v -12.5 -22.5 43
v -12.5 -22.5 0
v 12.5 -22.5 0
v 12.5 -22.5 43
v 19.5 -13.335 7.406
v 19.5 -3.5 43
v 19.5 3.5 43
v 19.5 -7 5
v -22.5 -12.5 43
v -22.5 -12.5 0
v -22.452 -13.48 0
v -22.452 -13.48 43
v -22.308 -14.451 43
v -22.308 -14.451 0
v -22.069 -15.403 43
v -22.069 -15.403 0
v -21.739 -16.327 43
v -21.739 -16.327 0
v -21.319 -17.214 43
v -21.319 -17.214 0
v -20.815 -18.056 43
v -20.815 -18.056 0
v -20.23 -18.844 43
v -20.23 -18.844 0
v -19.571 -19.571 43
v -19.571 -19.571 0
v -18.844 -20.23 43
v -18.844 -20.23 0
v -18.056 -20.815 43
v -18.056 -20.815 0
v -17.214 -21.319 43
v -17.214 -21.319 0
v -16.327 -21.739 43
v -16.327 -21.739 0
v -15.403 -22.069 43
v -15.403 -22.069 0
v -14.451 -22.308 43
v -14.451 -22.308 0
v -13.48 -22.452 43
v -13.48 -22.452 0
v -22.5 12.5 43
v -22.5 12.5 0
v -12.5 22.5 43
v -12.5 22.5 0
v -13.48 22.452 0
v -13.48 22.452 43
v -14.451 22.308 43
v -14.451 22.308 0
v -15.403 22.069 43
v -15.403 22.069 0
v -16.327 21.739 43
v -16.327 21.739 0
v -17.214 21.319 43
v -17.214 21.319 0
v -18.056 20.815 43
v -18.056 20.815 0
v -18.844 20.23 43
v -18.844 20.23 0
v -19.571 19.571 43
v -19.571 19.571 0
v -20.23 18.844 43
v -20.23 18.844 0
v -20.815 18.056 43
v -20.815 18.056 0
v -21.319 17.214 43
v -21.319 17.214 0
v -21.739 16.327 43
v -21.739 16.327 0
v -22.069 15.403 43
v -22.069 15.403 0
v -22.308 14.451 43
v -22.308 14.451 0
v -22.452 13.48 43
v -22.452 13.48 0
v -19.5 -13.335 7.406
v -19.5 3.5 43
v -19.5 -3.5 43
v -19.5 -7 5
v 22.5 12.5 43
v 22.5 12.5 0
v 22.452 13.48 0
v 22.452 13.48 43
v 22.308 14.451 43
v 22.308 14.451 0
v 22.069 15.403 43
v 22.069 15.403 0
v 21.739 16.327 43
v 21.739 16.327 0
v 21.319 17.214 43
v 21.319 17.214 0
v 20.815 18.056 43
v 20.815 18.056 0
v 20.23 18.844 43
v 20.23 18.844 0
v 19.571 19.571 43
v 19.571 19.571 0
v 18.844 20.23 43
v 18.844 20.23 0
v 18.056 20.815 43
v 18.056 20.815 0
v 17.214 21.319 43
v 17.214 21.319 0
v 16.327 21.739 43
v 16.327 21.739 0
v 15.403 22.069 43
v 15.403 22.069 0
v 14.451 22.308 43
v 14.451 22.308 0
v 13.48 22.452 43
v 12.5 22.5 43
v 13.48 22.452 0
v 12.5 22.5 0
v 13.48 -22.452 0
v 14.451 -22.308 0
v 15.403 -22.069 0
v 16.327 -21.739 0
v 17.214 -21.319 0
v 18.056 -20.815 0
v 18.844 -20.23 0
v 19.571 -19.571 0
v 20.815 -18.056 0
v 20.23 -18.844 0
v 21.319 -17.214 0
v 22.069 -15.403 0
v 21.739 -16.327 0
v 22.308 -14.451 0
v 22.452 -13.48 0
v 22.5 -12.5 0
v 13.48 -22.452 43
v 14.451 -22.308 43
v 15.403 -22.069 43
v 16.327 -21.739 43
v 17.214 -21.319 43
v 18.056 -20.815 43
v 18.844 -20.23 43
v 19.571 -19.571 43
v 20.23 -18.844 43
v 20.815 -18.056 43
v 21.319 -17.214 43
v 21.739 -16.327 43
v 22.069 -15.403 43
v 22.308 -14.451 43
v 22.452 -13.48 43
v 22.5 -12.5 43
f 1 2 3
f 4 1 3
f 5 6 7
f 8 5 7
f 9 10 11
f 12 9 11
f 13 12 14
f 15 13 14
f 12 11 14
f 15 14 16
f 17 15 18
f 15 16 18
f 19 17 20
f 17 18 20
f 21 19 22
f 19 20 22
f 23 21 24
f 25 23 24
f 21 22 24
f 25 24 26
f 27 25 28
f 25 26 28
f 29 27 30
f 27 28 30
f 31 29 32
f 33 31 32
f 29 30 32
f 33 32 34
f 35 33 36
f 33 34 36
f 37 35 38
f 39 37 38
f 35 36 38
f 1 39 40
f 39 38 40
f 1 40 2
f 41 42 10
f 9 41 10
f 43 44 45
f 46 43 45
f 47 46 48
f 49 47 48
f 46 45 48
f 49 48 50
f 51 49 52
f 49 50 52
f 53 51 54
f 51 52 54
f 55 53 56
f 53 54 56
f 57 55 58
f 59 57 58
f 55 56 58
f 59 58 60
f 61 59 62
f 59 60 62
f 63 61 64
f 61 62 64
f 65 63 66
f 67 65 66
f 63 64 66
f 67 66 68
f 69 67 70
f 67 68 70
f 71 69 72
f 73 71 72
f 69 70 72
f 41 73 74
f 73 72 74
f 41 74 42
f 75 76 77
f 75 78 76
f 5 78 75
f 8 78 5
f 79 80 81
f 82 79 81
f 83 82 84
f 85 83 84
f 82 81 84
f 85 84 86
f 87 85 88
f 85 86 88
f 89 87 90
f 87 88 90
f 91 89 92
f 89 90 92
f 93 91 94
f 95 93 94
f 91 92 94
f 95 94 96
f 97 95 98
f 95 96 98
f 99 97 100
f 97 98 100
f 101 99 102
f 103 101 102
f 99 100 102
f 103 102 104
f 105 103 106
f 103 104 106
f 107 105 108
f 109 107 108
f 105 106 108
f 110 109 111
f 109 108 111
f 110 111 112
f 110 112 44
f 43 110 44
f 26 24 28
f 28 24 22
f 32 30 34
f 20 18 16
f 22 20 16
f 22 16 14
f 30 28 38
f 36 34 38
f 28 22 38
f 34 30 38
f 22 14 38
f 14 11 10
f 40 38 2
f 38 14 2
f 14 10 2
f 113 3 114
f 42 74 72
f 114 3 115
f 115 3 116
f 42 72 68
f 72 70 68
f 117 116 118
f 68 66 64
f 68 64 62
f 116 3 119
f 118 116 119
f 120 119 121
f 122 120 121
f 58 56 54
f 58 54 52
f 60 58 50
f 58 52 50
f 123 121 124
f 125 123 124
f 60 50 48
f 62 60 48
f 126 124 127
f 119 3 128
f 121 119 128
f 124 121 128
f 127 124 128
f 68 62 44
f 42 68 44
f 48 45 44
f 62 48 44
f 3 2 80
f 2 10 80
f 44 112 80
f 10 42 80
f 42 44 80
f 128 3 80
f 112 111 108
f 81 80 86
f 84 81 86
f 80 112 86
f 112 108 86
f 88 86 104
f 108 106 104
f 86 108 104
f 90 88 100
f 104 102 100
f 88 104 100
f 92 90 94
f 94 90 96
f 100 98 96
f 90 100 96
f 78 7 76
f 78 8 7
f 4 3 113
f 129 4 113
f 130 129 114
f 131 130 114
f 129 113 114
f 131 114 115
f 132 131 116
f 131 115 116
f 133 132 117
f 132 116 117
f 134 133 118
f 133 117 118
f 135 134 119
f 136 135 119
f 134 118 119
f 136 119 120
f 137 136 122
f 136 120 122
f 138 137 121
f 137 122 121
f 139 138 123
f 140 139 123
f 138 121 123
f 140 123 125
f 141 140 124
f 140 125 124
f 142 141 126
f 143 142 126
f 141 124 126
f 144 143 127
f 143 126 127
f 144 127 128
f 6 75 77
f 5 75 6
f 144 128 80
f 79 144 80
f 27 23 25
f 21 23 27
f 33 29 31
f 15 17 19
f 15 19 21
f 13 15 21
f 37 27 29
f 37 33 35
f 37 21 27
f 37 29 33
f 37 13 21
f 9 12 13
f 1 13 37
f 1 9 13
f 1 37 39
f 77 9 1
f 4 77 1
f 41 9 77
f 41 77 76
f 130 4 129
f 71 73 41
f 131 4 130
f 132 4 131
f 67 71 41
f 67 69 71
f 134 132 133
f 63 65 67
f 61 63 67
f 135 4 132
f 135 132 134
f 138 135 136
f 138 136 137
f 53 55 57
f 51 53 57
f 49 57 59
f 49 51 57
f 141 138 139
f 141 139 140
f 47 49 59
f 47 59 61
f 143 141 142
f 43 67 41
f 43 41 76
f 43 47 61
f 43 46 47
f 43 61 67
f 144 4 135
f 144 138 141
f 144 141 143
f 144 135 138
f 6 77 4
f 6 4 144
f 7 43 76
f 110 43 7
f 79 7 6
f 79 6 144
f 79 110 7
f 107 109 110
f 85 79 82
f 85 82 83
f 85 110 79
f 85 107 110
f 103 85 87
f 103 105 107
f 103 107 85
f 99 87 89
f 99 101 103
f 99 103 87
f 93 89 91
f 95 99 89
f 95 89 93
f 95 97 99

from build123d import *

# Parameters (mm, degrees)
F1_DEPTH = 43
F2_W     = 39
F2_H     = 7
F4_W     = 39
F4_H     = 7
F6_W     = 39
F6_H     = 7
F7_ANGLE = -20.8


with BuildPart() as f1:
    # F0 (on Top) → F1 (new body)
    with BuildSketch(Plane.XY):
        with BuildLine():
            Line((-12.5, -22.5), (12.5, -22.5))
            ThreePointArc((12.5, -22.5), (19.571068, -19.571068), (22.5, -12.5))
            Line((22.5, -12.5), (22.5, 12.5))
            ThreePointArc((22.5, 12.5), (19.571068, 19.571068), (12.5, 22.5))
            Line((12.5, 22.5), (-12.5, 22.5))
            ThreePointArc((-12.5, 22.5), (-19.571068, 19.571068), (-22.5, 12.5))
            Line((-22.5, 12.5), (-22.5, -12.5))
            ThreePointArc((-22.5, -12.5), (-19.571068, -19.571068), (-12.5, -22.5))
        make_face()
    extrude(amount=F1_DEPTH)

    # F2 (on face) → F5 section 0
    with BuildSketch(Plane.XY.offset(43)):
        Rectangle(F2_W, F2_H)
    # F4 (on offset) → F5 section 1
    with BuildSketch(Plane.XY.offset(5)):
        with Locations((0, -10.5)):
            Rectangle(F4_W, F4_H)
    loft(mode=Mode.SUBTRACT)

    # F6 (on face) → F7 (revolve)
    with BuildSketch(Plane.XY.offset(5)):
        with Locations((0, -10.5)):
            Rectangle(F6_W, F6_H)
    revolve(axis=Axis((0, -7, 5), (1, 0, 0)), revolution_arc=F7_ANGLE)


solid = f1.part
